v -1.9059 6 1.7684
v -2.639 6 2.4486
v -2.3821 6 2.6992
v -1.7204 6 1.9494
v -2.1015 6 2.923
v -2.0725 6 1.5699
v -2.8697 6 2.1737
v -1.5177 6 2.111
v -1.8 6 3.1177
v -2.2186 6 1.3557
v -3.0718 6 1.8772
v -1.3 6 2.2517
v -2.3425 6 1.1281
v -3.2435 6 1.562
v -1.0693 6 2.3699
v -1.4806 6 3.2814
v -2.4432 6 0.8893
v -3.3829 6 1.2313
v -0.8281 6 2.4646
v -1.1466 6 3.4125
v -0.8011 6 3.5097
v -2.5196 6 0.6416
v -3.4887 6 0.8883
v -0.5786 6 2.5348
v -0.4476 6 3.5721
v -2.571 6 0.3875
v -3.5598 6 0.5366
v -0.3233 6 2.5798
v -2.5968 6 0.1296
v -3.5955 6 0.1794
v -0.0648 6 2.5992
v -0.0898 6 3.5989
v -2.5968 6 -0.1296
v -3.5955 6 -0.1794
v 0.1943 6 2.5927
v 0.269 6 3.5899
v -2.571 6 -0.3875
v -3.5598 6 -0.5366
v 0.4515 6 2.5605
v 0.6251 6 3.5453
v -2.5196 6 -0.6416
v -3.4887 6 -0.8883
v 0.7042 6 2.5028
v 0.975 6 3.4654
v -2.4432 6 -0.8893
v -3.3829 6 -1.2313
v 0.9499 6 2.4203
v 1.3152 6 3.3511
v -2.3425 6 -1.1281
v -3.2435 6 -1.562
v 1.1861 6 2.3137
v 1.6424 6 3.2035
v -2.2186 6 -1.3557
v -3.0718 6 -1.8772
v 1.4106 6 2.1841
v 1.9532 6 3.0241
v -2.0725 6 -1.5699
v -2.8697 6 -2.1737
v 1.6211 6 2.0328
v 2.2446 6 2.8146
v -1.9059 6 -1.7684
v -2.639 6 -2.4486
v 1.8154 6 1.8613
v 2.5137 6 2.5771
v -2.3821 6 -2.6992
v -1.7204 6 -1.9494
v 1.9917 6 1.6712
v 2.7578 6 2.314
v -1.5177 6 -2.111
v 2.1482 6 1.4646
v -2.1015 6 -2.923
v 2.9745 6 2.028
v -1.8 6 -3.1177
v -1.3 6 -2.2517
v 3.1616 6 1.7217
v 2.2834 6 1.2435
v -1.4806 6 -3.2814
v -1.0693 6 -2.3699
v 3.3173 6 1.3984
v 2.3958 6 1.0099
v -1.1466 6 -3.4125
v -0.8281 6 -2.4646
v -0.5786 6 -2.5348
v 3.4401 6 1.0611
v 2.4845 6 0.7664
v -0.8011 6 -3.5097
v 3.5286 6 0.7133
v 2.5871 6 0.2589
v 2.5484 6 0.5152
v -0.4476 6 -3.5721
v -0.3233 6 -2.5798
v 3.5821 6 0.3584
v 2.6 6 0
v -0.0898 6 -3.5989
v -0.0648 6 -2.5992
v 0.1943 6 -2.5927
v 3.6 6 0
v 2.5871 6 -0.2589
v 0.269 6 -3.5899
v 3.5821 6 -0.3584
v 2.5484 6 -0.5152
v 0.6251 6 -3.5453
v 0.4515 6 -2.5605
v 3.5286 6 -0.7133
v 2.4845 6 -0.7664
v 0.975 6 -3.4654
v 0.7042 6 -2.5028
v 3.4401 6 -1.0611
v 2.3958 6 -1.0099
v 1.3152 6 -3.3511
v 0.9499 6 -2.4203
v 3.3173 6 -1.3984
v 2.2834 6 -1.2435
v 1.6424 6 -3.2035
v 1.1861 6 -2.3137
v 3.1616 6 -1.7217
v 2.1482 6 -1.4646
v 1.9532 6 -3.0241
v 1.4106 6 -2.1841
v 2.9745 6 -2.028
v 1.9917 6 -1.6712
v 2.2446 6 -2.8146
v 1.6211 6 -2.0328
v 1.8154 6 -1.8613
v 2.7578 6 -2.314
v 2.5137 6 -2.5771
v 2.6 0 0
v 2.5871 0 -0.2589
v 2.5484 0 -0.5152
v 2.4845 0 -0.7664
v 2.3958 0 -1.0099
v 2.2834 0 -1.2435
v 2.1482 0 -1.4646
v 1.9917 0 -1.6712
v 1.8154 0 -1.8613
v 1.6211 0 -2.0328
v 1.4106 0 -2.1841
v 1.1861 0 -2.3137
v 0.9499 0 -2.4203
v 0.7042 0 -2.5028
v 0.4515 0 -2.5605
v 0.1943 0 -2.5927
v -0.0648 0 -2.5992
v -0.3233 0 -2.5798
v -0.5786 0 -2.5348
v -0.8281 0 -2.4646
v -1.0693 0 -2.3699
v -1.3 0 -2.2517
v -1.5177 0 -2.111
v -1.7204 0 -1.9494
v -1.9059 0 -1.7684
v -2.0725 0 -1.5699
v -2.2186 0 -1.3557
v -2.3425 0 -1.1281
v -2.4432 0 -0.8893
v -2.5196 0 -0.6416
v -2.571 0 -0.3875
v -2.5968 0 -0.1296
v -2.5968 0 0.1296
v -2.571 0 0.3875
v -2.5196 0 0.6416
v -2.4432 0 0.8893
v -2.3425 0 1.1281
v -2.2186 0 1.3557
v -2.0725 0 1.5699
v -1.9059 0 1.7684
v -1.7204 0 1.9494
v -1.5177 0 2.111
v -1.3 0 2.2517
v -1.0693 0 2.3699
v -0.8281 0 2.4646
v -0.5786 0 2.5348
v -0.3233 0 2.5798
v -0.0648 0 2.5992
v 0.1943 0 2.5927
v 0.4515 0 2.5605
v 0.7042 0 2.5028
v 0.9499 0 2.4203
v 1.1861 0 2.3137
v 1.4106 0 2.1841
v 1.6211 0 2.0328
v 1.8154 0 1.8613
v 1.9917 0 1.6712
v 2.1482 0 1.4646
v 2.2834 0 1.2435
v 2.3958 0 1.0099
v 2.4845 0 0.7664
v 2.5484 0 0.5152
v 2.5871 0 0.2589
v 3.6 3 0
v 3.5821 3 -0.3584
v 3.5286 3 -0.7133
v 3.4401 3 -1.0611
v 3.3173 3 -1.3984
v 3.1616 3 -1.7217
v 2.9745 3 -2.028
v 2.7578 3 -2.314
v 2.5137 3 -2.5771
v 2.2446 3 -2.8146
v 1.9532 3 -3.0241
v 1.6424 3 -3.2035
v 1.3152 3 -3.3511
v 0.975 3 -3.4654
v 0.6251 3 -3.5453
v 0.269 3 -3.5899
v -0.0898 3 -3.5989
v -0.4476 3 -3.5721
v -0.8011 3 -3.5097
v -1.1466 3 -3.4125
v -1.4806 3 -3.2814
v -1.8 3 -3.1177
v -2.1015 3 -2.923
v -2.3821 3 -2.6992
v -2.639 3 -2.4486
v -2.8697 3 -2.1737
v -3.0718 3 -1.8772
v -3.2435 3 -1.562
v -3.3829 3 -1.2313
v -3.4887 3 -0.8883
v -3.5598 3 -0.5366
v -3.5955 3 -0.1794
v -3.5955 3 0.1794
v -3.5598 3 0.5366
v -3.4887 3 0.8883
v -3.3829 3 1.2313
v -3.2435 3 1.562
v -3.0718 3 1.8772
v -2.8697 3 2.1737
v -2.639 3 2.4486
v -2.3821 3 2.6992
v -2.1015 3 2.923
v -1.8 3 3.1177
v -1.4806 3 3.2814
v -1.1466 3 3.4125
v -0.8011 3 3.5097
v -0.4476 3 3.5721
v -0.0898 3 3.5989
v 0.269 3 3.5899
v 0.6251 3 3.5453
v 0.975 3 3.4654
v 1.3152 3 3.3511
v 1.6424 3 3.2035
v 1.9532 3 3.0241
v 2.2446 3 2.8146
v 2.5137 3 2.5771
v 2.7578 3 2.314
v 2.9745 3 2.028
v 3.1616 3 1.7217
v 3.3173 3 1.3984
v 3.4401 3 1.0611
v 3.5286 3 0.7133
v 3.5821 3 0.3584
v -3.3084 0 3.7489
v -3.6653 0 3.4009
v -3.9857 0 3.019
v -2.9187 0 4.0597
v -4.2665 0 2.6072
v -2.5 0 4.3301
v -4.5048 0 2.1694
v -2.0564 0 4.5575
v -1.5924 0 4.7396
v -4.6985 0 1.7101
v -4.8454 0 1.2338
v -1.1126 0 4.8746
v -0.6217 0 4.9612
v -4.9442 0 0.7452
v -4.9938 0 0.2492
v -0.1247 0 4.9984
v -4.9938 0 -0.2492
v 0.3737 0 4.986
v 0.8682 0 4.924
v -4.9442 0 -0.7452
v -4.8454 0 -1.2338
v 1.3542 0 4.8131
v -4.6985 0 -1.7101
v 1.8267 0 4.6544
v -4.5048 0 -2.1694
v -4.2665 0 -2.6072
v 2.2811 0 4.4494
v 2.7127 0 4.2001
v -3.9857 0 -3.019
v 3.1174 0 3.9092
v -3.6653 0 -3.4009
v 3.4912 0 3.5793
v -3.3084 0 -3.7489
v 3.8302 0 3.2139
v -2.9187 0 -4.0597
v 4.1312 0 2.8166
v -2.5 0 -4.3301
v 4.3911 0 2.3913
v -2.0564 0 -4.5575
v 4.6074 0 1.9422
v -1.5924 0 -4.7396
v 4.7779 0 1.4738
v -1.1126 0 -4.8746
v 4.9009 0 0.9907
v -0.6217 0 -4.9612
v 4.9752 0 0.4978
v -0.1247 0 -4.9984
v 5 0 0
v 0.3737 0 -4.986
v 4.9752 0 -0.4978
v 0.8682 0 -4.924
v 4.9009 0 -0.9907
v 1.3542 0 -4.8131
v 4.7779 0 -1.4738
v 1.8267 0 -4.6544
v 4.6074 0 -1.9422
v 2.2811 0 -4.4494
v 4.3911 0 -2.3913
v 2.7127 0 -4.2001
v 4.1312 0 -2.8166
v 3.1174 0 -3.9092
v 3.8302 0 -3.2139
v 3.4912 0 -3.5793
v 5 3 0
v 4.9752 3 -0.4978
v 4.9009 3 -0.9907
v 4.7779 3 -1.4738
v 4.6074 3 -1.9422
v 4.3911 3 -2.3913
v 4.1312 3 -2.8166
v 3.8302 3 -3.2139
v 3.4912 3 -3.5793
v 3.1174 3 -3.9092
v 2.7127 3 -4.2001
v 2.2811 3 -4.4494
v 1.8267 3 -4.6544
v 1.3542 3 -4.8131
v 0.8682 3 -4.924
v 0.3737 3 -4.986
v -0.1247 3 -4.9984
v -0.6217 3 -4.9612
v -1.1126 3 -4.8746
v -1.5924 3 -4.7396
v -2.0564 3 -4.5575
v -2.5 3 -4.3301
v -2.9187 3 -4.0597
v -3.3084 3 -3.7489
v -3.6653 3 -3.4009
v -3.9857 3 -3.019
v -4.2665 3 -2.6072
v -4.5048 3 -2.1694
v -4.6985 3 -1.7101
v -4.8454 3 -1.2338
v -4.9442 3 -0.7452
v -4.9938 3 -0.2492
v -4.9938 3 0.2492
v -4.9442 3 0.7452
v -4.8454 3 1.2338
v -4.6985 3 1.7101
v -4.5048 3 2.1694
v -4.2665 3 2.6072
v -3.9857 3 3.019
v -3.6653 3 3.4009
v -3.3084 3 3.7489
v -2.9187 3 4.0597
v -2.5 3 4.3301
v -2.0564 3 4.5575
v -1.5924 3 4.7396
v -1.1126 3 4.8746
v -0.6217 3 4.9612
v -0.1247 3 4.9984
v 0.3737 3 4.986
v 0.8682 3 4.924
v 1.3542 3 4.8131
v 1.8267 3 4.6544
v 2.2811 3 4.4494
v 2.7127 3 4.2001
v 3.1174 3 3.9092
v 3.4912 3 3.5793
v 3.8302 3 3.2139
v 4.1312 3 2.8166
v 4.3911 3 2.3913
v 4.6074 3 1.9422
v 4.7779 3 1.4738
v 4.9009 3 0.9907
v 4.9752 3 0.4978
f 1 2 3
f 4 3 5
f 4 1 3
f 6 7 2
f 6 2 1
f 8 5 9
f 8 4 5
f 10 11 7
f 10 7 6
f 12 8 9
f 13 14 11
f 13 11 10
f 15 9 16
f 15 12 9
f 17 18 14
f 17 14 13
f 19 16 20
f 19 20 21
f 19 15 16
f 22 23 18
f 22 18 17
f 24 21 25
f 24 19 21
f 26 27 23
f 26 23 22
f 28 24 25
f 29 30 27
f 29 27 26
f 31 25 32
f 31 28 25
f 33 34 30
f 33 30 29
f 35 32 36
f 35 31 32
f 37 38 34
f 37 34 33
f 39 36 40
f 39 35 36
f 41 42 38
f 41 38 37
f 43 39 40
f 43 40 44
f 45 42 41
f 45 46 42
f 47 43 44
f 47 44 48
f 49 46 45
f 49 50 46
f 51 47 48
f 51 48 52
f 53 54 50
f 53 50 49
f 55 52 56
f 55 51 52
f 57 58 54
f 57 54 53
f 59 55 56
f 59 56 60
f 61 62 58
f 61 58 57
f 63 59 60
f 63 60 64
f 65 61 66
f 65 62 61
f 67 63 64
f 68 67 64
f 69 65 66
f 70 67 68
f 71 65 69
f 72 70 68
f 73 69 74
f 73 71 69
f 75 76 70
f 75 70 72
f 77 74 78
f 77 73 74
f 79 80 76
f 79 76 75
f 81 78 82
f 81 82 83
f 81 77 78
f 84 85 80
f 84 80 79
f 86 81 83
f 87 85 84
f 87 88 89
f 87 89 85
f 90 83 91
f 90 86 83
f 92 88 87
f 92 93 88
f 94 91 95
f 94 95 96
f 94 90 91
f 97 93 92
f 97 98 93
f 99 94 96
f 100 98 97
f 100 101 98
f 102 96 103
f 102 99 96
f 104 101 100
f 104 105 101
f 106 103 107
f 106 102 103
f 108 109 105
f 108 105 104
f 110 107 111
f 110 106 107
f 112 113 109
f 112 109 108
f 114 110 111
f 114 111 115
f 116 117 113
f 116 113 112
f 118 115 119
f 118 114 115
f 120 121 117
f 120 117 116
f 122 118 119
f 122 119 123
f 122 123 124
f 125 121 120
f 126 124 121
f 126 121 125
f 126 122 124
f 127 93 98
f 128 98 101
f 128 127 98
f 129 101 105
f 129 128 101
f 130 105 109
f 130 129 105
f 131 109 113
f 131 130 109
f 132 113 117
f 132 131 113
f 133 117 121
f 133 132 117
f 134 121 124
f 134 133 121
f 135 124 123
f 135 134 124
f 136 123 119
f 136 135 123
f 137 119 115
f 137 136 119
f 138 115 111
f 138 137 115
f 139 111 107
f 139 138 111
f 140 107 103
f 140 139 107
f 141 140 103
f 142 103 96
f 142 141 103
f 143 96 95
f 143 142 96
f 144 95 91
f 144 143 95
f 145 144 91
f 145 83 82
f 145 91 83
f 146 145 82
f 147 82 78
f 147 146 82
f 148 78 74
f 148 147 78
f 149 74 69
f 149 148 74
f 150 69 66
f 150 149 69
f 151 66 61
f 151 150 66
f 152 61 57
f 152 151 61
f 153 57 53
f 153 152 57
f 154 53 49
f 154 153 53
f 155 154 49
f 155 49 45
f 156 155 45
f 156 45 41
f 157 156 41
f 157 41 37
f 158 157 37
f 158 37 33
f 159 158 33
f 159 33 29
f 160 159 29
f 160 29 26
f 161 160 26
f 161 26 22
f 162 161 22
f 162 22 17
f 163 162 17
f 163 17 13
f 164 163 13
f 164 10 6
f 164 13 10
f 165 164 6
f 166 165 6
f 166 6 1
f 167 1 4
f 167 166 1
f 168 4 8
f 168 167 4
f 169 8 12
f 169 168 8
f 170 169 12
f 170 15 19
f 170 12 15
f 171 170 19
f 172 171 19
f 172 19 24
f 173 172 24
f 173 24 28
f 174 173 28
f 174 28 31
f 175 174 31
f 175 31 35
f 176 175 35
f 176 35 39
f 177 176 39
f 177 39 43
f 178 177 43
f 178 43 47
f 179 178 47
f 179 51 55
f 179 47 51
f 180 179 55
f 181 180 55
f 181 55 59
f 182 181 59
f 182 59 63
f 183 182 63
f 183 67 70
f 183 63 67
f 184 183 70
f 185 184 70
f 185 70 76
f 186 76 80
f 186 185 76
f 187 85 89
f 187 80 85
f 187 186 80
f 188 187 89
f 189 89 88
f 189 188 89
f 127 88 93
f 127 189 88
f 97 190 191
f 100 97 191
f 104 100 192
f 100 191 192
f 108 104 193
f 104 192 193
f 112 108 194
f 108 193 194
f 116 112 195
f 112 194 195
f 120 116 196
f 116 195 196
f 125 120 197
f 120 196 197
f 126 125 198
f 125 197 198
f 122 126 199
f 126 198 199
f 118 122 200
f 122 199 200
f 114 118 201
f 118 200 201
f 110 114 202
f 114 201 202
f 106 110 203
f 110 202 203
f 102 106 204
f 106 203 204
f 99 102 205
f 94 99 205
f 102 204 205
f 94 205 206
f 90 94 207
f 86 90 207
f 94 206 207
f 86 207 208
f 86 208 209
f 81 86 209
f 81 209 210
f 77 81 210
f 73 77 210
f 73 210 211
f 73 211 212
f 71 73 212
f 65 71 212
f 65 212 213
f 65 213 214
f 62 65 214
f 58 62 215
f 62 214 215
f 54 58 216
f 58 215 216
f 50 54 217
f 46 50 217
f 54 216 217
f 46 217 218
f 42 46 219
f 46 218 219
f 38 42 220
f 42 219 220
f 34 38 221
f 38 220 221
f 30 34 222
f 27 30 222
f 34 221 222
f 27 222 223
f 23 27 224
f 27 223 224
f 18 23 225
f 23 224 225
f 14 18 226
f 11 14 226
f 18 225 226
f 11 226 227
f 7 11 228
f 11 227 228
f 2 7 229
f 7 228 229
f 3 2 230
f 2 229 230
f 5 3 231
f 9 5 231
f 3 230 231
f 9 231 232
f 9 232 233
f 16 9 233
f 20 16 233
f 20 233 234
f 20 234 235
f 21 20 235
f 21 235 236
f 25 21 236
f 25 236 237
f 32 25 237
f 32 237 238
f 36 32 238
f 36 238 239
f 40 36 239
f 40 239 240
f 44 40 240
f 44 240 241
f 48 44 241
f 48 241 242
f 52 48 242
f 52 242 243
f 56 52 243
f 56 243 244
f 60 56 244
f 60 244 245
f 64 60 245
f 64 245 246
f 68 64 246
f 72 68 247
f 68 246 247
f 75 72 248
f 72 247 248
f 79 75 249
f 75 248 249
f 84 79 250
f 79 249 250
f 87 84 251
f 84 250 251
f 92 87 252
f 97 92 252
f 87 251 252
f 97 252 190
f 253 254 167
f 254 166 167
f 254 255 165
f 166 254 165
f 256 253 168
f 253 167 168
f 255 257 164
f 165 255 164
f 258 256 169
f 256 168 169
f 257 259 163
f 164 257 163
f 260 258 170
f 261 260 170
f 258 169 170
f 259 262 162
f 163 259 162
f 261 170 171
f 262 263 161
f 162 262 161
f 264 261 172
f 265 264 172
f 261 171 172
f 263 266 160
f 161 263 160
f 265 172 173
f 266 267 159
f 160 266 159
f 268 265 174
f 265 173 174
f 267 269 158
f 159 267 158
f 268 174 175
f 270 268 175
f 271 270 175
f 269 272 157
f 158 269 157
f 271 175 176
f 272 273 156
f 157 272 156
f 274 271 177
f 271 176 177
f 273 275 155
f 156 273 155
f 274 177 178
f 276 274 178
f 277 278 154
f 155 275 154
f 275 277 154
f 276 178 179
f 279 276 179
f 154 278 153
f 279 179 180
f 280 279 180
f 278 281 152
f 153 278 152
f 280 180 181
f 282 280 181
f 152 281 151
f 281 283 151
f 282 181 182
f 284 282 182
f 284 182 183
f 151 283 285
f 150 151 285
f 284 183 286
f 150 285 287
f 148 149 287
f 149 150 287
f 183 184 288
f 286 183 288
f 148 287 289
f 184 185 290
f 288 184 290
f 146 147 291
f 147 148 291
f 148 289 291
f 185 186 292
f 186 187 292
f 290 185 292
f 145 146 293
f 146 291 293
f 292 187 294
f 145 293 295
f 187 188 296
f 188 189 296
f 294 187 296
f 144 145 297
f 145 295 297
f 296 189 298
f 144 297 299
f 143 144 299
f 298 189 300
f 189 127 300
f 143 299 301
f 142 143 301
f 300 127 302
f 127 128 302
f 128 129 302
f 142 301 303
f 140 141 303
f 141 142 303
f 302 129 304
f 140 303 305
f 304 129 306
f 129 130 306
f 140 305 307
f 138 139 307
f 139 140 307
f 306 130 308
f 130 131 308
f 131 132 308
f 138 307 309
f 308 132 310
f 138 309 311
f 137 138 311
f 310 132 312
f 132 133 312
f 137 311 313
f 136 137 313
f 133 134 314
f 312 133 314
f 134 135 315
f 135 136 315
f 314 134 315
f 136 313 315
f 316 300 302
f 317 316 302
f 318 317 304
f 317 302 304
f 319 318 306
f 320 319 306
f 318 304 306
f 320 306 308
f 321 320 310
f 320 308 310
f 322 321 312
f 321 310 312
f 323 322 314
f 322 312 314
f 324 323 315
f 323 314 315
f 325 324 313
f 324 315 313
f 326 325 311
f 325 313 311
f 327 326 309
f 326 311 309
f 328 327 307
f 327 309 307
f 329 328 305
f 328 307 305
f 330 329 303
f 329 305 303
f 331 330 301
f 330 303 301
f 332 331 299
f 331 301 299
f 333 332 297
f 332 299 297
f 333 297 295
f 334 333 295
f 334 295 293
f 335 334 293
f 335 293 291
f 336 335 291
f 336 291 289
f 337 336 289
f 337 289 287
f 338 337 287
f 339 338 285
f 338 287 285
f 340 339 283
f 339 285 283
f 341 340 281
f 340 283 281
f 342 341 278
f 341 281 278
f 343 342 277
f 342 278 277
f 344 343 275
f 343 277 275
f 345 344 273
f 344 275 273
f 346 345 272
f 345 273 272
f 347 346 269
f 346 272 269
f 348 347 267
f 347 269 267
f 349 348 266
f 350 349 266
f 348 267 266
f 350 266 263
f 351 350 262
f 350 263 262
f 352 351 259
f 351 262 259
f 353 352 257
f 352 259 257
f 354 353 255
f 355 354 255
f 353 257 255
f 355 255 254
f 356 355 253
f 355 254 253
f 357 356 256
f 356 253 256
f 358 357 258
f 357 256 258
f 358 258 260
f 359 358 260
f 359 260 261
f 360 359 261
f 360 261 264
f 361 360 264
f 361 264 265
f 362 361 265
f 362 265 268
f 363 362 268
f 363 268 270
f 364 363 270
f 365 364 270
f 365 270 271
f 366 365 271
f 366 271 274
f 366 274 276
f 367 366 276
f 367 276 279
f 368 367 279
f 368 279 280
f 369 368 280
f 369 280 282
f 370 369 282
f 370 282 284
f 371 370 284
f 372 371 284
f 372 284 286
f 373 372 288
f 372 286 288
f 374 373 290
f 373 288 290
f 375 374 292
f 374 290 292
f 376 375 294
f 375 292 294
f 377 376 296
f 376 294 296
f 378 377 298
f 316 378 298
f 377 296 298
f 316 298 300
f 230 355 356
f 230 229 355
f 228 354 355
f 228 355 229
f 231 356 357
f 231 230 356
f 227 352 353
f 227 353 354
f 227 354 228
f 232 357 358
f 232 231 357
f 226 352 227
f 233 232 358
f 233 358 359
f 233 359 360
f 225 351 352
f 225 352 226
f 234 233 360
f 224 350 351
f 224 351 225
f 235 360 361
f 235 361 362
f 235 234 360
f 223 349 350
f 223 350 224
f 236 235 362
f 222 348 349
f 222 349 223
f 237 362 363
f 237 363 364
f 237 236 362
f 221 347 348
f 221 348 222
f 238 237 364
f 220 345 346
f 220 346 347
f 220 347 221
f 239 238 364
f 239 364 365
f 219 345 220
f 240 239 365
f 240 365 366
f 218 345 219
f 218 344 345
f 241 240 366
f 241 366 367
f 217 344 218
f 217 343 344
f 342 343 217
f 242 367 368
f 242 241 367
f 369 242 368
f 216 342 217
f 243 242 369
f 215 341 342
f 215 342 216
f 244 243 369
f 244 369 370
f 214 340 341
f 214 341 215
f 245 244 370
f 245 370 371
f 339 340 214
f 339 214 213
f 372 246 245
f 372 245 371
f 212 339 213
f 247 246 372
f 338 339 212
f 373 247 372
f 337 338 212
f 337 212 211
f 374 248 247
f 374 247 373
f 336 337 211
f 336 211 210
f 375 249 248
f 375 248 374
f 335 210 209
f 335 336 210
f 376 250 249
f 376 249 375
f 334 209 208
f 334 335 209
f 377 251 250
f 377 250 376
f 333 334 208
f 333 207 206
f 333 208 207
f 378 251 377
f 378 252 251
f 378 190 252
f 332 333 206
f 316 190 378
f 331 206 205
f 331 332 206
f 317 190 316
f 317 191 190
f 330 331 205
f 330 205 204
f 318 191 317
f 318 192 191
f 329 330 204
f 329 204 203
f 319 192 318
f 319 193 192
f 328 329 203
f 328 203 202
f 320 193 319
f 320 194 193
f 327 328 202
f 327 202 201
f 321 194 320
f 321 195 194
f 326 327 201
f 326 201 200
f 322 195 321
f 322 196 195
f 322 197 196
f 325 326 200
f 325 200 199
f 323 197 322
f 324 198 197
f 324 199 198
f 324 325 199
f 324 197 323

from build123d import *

# Parameters (mm, degrees)
SKETCH1_R           = 5
BOSS_EXTRUDE1_DEPTH = 3
SKETCH2_R           = 3.6
BOSS_EXTRUDE2_DEPTH = 3
SKETCH3_R           = 2.6
CUT_EXTRUDE1_DEPTH  = 7


with BuildPart() as part:
    # Sketch1 → Boss-Extrude1 (new body)
    with BuildSketch(Plane(origin=(0, 0, 0), x_dir=(1, 0, 0), z_dir=(0, 1, 0))):
        Circle(SKETCH1_R)
    extrude(amount=BOSS_EXTRUDE1_DEPTH)

    # Sketch2 → Boss-Extrude2 (add)
    with BuildSketch(Plane(origin=(0, 3, 0), x_dir=(1, 0, 0), z_dir=(0, 1, 0))):
        Circle(SKETCH2_R)
    extrude(amount=BOSS_EXTRUDE2_DEPTH)

    # Sketch3 → Cut-Extrude1 (cut, through all)
    with BuildSketch(Plane(origin=(0, 0, 0), x_dir=(1, 0, 0), z_dir=(0, 1, 0))):
        Circle(SKETCH3_R)
    extrude(amount=CUT_EXTRUDE1_DEPTH, mode=Mode.SUBTRACT)


solid = part.part
